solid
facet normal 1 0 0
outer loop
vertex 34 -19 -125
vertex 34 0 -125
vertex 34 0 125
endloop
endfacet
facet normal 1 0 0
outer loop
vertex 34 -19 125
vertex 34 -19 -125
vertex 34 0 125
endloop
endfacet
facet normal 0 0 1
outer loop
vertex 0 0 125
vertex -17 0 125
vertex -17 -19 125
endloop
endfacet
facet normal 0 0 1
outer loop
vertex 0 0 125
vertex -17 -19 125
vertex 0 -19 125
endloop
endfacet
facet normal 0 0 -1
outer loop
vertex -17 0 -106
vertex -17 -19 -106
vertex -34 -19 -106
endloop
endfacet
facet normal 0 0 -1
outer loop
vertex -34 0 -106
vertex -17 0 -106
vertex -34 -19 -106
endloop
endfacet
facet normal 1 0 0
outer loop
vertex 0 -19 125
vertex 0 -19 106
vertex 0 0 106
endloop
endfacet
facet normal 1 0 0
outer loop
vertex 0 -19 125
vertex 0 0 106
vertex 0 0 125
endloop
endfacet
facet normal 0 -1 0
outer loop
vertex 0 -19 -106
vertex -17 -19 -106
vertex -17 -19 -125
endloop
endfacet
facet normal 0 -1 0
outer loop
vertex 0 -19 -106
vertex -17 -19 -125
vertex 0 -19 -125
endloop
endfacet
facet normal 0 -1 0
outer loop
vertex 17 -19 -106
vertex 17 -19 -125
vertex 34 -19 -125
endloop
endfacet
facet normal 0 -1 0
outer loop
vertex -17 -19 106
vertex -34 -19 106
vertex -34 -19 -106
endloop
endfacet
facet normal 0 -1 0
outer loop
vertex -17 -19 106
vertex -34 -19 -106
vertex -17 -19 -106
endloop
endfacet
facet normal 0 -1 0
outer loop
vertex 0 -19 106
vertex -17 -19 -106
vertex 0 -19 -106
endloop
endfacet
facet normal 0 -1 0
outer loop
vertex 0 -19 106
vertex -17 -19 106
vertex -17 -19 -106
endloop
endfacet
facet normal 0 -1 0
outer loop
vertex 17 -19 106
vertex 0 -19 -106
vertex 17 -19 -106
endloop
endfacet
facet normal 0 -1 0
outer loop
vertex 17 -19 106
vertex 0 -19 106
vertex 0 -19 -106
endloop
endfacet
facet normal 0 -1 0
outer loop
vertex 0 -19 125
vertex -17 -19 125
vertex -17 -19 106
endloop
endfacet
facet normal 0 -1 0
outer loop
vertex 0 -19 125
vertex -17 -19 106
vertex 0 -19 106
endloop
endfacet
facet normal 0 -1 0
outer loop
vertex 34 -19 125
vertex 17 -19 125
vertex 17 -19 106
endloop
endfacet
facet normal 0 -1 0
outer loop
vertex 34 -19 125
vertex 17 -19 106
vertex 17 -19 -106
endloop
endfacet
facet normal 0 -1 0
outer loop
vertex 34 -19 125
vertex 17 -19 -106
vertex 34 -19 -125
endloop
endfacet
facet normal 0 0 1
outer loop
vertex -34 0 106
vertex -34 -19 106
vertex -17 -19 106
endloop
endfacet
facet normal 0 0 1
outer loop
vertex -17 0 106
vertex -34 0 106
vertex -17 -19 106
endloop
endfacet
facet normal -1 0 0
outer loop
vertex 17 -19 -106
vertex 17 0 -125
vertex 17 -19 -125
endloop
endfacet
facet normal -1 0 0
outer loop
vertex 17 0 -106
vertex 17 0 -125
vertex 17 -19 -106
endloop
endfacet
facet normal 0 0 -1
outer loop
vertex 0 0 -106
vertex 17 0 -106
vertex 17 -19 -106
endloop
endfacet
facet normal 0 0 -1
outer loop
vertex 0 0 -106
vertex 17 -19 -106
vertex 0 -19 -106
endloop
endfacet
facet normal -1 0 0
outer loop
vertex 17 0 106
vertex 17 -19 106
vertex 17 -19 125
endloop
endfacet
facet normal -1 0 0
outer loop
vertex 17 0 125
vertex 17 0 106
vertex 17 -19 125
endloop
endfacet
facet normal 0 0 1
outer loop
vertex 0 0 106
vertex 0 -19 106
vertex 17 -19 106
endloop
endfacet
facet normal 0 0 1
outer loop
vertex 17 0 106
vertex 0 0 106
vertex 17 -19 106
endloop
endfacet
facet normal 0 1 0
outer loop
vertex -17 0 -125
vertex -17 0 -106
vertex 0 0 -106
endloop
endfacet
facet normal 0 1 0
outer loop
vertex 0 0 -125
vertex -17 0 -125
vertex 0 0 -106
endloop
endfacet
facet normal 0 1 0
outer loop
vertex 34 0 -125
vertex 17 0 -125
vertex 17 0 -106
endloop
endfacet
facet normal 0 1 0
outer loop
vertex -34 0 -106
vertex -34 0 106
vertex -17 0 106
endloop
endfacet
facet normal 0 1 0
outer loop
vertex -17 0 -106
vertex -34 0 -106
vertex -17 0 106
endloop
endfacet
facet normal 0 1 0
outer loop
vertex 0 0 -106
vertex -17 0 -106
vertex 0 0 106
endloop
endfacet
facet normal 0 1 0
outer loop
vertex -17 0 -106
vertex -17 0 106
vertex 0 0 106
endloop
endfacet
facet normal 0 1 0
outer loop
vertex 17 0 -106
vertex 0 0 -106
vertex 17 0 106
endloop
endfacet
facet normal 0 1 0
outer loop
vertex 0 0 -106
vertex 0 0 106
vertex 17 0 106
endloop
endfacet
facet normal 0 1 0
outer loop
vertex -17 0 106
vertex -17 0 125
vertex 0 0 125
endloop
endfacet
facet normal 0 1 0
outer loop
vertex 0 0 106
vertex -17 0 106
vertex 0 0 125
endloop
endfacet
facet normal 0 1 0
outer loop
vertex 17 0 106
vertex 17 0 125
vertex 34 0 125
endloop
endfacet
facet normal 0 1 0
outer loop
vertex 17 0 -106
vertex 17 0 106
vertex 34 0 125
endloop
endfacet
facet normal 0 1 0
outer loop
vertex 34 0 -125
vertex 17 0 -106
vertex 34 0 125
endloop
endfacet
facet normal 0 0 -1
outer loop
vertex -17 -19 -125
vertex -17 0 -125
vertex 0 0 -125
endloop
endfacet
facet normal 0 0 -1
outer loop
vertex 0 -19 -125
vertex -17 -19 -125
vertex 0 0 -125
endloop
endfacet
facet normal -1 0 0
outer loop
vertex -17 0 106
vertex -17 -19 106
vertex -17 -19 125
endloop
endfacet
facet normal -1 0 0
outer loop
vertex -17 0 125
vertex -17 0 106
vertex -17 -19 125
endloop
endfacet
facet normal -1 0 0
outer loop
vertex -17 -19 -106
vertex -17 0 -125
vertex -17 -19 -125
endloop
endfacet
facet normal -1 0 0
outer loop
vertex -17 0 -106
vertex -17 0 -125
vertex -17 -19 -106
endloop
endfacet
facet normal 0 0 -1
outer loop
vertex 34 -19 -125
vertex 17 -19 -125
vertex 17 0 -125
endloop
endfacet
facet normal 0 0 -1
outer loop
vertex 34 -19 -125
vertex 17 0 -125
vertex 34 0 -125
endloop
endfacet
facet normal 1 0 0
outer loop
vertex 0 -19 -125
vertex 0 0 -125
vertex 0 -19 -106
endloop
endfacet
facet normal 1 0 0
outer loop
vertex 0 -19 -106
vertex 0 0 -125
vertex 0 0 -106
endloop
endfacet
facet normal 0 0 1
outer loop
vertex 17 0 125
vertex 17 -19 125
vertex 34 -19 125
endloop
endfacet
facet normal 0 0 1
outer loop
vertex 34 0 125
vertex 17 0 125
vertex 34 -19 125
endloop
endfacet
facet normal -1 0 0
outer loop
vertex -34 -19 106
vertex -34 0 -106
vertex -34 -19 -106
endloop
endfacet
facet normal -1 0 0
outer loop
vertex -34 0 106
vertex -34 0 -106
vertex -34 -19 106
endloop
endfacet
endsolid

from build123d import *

# Parameters (mm, degrees)
F0_W     = 68
F0_H     = 250
F1_DEPTH = 19
F2_W     = 17
F2_H     = 19
F3_DEPTH = 19.001
F4_W     = 17
F4_H     = 19
F5_DEPTH = 19.001


with BuildPart() as f1:
    # F0 (on Front) → F1 (new body)
    with BuildSketch(Plane.XZ):
        Rectangle(F0_W, F0_H)
    extrude(amount=F1_DEPTH)

    # F2 (on face) → F3 (cut, through all)
    with BuildSketch(Plane.XZ.offset(19)):
        with Locations((8.5, 115.5)):
            Rectangle(F2_W, F2_H)
        with Locations((-25.5, 115.5)):
            Rectangle(F2_W, F2_H)
    extrude(amount=-F3_DEPTH, mode=Mode.SUBTRACT)

    # F4 (on face) → F5 (cut, through all)
    with BuildSketch(Plane(origin=(0, 0, 0), x_dir=(-1, 0, 0), z_dir=(0, 1, 0))):
        with Locations((25.5, -115.5)):
            Rectangle(F4_W, F4_H)
        with Locations((-8.5, -115.5)):
            Rectangle(F4_W, F4_H)
    extrude(amount=-F5_DEPTH, mode=Mode.SUBTRACT)


solid = f1.part
